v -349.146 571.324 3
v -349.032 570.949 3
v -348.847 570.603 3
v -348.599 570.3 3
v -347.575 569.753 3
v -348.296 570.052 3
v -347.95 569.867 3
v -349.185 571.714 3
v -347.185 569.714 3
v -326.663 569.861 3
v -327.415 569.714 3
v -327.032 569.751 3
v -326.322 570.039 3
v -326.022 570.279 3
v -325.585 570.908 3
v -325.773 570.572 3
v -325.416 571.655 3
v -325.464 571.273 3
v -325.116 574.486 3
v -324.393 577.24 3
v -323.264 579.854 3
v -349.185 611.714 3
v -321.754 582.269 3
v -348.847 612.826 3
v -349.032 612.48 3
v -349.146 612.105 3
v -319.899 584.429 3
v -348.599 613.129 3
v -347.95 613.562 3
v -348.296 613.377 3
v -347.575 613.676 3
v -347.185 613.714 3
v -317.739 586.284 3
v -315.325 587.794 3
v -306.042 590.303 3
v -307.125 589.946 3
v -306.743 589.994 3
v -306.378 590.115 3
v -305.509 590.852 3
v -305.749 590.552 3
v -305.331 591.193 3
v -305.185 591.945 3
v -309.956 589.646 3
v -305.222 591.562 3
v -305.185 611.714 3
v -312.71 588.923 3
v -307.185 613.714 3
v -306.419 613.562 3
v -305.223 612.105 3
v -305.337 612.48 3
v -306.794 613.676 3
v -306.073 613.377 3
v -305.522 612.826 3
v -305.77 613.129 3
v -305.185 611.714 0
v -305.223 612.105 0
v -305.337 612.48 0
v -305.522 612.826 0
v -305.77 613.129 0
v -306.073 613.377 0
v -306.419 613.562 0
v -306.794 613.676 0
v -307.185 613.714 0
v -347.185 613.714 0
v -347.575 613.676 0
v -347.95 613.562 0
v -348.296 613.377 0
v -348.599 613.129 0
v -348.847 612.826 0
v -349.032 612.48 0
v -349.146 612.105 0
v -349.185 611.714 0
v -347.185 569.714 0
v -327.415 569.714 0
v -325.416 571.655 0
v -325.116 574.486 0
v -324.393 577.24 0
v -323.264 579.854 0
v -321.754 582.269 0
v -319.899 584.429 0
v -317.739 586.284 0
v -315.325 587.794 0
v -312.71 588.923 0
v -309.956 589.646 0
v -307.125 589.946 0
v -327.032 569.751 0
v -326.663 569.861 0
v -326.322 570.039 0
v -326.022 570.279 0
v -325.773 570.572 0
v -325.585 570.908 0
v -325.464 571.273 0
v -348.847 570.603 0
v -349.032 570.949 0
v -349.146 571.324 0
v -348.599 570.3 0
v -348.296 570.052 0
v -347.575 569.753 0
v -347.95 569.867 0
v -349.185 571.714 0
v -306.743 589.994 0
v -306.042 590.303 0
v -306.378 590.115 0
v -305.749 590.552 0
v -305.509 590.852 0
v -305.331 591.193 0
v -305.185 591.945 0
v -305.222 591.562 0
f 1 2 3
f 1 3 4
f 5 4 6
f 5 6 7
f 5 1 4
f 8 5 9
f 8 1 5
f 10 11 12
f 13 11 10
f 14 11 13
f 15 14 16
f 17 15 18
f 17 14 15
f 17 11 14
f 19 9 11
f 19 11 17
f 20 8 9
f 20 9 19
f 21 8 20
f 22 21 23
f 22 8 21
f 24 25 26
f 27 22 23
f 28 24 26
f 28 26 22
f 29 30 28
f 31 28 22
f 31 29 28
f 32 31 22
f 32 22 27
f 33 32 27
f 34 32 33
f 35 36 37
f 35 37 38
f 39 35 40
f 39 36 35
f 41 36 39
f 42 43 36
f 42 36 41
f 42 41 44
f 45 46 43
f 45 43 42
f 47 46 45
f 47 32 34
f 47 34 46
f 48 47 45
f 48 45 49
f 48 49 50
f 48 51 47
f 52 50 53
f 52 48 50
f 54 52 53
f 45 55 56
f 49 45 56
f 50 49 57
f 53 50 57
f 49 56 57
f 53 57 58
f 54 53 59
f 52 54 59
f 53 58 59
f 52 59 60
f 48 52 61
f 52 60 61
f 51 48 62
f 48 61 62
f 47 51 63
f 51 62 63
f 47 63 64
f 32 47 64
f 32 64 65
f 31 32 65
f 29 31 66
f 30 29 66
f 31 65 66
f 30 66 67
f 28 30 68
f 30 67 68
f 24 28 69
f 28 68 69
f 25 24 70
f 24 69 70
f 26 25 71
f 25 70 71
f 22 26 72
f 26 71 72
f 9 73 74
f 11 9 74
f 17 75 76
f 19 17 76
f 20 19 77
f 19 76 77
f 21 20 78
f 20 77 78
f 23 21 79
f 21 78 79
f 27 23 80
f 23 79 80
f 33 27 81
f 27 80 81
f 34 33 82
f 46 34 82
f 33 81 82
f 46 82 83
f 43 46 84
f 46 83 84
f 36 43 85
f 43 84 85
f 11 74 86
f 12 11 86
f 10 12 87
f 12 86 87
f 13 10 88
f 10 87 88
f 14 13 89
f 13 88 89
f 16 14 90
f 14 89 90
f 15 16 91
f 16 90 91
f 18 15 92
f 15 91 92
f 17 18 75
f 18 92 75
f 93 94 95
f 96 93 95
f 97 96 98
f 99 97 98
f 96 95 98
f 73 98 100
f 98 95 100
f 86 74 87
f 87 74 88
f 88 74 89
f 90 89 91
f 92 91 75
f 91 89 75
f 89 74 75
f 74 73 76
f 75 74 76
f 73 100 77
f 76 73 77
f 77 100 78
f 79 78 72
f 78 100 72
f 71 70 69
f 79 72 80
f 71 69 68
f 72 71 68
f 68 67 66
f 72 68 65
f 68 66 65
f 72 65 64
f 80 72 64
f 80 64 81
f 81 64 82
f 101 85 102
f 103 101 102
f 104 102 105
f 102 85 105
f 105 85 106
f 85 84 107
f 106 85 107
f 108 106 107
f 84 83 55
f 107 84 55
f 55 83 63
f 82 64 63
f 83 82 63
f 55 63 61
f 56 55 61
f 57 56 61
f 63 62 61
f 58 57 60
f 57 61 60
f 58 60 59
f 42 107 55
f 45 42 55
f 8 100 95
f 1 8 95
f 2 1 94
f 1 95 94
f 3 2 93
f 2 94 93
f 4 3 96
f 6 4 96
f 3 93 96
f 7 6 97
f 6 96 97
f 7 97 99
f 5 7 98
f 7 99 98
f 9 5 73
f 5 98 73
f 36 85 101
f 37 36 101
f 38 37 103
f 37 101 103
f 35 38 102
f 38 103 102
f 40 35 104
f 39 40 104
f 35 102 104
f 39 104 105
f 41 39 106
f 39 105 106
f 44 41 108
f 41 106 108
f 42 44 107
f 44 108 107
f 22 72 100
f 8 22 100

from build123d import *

# Parameters (mm, degrees)
BOSS_EXTRUDE1_DEPTH = 3


with BuildPart() as part:
    # Sketch1 → Boss-Extrude1 (new body)
    with BuildSketch(Plane.XY):
        with BuildLine():
            Line((-307.184555639, 613.714480845), (-347.184555639, 613.714480845))
            ThreePointArc((-347.184555639, 613.714480845), (-348.598769202, 613.128694407), (-349.184555639, 611.714480845))
            Line((-349.184555639, 611.714480845), (-349.184555639, 571.714480845))
            ThreePointArc((-349.184555639, 571.714480845), (-348.598769202, 570.300267282), (-347.184555639, 569.714480845))
            Line((-347.184555639, 569.714480845), (-327.414726928, 569.714480845))
            ThreePointArc((-327.414726928, 569.714480845), (-326.021875182, 570.279223372), (-325.415626051, 571.65451683))
            ThreePointArc((-325.415626051, 571.65451683), (-319.898638459, 584.428563664), (-307.124591625, 589.945551256))
            ThreePointArc((-307.124591625, 589.945551256), (-305.749298166, 590.551800388), (-305.184555639, 591.944652133))
            Line((-305.184555639, 591.944652133), (-305.184555639, 611.714480845))
            ThreePointArc((-305.184555639, 611.714480845), (-305.770342077, 613.128694407), (-307.184555639, 613.714480845))
        make_face()
    extrude(amount=BOSS_EXTRUDE1_DEPTH)


solid = part.part
